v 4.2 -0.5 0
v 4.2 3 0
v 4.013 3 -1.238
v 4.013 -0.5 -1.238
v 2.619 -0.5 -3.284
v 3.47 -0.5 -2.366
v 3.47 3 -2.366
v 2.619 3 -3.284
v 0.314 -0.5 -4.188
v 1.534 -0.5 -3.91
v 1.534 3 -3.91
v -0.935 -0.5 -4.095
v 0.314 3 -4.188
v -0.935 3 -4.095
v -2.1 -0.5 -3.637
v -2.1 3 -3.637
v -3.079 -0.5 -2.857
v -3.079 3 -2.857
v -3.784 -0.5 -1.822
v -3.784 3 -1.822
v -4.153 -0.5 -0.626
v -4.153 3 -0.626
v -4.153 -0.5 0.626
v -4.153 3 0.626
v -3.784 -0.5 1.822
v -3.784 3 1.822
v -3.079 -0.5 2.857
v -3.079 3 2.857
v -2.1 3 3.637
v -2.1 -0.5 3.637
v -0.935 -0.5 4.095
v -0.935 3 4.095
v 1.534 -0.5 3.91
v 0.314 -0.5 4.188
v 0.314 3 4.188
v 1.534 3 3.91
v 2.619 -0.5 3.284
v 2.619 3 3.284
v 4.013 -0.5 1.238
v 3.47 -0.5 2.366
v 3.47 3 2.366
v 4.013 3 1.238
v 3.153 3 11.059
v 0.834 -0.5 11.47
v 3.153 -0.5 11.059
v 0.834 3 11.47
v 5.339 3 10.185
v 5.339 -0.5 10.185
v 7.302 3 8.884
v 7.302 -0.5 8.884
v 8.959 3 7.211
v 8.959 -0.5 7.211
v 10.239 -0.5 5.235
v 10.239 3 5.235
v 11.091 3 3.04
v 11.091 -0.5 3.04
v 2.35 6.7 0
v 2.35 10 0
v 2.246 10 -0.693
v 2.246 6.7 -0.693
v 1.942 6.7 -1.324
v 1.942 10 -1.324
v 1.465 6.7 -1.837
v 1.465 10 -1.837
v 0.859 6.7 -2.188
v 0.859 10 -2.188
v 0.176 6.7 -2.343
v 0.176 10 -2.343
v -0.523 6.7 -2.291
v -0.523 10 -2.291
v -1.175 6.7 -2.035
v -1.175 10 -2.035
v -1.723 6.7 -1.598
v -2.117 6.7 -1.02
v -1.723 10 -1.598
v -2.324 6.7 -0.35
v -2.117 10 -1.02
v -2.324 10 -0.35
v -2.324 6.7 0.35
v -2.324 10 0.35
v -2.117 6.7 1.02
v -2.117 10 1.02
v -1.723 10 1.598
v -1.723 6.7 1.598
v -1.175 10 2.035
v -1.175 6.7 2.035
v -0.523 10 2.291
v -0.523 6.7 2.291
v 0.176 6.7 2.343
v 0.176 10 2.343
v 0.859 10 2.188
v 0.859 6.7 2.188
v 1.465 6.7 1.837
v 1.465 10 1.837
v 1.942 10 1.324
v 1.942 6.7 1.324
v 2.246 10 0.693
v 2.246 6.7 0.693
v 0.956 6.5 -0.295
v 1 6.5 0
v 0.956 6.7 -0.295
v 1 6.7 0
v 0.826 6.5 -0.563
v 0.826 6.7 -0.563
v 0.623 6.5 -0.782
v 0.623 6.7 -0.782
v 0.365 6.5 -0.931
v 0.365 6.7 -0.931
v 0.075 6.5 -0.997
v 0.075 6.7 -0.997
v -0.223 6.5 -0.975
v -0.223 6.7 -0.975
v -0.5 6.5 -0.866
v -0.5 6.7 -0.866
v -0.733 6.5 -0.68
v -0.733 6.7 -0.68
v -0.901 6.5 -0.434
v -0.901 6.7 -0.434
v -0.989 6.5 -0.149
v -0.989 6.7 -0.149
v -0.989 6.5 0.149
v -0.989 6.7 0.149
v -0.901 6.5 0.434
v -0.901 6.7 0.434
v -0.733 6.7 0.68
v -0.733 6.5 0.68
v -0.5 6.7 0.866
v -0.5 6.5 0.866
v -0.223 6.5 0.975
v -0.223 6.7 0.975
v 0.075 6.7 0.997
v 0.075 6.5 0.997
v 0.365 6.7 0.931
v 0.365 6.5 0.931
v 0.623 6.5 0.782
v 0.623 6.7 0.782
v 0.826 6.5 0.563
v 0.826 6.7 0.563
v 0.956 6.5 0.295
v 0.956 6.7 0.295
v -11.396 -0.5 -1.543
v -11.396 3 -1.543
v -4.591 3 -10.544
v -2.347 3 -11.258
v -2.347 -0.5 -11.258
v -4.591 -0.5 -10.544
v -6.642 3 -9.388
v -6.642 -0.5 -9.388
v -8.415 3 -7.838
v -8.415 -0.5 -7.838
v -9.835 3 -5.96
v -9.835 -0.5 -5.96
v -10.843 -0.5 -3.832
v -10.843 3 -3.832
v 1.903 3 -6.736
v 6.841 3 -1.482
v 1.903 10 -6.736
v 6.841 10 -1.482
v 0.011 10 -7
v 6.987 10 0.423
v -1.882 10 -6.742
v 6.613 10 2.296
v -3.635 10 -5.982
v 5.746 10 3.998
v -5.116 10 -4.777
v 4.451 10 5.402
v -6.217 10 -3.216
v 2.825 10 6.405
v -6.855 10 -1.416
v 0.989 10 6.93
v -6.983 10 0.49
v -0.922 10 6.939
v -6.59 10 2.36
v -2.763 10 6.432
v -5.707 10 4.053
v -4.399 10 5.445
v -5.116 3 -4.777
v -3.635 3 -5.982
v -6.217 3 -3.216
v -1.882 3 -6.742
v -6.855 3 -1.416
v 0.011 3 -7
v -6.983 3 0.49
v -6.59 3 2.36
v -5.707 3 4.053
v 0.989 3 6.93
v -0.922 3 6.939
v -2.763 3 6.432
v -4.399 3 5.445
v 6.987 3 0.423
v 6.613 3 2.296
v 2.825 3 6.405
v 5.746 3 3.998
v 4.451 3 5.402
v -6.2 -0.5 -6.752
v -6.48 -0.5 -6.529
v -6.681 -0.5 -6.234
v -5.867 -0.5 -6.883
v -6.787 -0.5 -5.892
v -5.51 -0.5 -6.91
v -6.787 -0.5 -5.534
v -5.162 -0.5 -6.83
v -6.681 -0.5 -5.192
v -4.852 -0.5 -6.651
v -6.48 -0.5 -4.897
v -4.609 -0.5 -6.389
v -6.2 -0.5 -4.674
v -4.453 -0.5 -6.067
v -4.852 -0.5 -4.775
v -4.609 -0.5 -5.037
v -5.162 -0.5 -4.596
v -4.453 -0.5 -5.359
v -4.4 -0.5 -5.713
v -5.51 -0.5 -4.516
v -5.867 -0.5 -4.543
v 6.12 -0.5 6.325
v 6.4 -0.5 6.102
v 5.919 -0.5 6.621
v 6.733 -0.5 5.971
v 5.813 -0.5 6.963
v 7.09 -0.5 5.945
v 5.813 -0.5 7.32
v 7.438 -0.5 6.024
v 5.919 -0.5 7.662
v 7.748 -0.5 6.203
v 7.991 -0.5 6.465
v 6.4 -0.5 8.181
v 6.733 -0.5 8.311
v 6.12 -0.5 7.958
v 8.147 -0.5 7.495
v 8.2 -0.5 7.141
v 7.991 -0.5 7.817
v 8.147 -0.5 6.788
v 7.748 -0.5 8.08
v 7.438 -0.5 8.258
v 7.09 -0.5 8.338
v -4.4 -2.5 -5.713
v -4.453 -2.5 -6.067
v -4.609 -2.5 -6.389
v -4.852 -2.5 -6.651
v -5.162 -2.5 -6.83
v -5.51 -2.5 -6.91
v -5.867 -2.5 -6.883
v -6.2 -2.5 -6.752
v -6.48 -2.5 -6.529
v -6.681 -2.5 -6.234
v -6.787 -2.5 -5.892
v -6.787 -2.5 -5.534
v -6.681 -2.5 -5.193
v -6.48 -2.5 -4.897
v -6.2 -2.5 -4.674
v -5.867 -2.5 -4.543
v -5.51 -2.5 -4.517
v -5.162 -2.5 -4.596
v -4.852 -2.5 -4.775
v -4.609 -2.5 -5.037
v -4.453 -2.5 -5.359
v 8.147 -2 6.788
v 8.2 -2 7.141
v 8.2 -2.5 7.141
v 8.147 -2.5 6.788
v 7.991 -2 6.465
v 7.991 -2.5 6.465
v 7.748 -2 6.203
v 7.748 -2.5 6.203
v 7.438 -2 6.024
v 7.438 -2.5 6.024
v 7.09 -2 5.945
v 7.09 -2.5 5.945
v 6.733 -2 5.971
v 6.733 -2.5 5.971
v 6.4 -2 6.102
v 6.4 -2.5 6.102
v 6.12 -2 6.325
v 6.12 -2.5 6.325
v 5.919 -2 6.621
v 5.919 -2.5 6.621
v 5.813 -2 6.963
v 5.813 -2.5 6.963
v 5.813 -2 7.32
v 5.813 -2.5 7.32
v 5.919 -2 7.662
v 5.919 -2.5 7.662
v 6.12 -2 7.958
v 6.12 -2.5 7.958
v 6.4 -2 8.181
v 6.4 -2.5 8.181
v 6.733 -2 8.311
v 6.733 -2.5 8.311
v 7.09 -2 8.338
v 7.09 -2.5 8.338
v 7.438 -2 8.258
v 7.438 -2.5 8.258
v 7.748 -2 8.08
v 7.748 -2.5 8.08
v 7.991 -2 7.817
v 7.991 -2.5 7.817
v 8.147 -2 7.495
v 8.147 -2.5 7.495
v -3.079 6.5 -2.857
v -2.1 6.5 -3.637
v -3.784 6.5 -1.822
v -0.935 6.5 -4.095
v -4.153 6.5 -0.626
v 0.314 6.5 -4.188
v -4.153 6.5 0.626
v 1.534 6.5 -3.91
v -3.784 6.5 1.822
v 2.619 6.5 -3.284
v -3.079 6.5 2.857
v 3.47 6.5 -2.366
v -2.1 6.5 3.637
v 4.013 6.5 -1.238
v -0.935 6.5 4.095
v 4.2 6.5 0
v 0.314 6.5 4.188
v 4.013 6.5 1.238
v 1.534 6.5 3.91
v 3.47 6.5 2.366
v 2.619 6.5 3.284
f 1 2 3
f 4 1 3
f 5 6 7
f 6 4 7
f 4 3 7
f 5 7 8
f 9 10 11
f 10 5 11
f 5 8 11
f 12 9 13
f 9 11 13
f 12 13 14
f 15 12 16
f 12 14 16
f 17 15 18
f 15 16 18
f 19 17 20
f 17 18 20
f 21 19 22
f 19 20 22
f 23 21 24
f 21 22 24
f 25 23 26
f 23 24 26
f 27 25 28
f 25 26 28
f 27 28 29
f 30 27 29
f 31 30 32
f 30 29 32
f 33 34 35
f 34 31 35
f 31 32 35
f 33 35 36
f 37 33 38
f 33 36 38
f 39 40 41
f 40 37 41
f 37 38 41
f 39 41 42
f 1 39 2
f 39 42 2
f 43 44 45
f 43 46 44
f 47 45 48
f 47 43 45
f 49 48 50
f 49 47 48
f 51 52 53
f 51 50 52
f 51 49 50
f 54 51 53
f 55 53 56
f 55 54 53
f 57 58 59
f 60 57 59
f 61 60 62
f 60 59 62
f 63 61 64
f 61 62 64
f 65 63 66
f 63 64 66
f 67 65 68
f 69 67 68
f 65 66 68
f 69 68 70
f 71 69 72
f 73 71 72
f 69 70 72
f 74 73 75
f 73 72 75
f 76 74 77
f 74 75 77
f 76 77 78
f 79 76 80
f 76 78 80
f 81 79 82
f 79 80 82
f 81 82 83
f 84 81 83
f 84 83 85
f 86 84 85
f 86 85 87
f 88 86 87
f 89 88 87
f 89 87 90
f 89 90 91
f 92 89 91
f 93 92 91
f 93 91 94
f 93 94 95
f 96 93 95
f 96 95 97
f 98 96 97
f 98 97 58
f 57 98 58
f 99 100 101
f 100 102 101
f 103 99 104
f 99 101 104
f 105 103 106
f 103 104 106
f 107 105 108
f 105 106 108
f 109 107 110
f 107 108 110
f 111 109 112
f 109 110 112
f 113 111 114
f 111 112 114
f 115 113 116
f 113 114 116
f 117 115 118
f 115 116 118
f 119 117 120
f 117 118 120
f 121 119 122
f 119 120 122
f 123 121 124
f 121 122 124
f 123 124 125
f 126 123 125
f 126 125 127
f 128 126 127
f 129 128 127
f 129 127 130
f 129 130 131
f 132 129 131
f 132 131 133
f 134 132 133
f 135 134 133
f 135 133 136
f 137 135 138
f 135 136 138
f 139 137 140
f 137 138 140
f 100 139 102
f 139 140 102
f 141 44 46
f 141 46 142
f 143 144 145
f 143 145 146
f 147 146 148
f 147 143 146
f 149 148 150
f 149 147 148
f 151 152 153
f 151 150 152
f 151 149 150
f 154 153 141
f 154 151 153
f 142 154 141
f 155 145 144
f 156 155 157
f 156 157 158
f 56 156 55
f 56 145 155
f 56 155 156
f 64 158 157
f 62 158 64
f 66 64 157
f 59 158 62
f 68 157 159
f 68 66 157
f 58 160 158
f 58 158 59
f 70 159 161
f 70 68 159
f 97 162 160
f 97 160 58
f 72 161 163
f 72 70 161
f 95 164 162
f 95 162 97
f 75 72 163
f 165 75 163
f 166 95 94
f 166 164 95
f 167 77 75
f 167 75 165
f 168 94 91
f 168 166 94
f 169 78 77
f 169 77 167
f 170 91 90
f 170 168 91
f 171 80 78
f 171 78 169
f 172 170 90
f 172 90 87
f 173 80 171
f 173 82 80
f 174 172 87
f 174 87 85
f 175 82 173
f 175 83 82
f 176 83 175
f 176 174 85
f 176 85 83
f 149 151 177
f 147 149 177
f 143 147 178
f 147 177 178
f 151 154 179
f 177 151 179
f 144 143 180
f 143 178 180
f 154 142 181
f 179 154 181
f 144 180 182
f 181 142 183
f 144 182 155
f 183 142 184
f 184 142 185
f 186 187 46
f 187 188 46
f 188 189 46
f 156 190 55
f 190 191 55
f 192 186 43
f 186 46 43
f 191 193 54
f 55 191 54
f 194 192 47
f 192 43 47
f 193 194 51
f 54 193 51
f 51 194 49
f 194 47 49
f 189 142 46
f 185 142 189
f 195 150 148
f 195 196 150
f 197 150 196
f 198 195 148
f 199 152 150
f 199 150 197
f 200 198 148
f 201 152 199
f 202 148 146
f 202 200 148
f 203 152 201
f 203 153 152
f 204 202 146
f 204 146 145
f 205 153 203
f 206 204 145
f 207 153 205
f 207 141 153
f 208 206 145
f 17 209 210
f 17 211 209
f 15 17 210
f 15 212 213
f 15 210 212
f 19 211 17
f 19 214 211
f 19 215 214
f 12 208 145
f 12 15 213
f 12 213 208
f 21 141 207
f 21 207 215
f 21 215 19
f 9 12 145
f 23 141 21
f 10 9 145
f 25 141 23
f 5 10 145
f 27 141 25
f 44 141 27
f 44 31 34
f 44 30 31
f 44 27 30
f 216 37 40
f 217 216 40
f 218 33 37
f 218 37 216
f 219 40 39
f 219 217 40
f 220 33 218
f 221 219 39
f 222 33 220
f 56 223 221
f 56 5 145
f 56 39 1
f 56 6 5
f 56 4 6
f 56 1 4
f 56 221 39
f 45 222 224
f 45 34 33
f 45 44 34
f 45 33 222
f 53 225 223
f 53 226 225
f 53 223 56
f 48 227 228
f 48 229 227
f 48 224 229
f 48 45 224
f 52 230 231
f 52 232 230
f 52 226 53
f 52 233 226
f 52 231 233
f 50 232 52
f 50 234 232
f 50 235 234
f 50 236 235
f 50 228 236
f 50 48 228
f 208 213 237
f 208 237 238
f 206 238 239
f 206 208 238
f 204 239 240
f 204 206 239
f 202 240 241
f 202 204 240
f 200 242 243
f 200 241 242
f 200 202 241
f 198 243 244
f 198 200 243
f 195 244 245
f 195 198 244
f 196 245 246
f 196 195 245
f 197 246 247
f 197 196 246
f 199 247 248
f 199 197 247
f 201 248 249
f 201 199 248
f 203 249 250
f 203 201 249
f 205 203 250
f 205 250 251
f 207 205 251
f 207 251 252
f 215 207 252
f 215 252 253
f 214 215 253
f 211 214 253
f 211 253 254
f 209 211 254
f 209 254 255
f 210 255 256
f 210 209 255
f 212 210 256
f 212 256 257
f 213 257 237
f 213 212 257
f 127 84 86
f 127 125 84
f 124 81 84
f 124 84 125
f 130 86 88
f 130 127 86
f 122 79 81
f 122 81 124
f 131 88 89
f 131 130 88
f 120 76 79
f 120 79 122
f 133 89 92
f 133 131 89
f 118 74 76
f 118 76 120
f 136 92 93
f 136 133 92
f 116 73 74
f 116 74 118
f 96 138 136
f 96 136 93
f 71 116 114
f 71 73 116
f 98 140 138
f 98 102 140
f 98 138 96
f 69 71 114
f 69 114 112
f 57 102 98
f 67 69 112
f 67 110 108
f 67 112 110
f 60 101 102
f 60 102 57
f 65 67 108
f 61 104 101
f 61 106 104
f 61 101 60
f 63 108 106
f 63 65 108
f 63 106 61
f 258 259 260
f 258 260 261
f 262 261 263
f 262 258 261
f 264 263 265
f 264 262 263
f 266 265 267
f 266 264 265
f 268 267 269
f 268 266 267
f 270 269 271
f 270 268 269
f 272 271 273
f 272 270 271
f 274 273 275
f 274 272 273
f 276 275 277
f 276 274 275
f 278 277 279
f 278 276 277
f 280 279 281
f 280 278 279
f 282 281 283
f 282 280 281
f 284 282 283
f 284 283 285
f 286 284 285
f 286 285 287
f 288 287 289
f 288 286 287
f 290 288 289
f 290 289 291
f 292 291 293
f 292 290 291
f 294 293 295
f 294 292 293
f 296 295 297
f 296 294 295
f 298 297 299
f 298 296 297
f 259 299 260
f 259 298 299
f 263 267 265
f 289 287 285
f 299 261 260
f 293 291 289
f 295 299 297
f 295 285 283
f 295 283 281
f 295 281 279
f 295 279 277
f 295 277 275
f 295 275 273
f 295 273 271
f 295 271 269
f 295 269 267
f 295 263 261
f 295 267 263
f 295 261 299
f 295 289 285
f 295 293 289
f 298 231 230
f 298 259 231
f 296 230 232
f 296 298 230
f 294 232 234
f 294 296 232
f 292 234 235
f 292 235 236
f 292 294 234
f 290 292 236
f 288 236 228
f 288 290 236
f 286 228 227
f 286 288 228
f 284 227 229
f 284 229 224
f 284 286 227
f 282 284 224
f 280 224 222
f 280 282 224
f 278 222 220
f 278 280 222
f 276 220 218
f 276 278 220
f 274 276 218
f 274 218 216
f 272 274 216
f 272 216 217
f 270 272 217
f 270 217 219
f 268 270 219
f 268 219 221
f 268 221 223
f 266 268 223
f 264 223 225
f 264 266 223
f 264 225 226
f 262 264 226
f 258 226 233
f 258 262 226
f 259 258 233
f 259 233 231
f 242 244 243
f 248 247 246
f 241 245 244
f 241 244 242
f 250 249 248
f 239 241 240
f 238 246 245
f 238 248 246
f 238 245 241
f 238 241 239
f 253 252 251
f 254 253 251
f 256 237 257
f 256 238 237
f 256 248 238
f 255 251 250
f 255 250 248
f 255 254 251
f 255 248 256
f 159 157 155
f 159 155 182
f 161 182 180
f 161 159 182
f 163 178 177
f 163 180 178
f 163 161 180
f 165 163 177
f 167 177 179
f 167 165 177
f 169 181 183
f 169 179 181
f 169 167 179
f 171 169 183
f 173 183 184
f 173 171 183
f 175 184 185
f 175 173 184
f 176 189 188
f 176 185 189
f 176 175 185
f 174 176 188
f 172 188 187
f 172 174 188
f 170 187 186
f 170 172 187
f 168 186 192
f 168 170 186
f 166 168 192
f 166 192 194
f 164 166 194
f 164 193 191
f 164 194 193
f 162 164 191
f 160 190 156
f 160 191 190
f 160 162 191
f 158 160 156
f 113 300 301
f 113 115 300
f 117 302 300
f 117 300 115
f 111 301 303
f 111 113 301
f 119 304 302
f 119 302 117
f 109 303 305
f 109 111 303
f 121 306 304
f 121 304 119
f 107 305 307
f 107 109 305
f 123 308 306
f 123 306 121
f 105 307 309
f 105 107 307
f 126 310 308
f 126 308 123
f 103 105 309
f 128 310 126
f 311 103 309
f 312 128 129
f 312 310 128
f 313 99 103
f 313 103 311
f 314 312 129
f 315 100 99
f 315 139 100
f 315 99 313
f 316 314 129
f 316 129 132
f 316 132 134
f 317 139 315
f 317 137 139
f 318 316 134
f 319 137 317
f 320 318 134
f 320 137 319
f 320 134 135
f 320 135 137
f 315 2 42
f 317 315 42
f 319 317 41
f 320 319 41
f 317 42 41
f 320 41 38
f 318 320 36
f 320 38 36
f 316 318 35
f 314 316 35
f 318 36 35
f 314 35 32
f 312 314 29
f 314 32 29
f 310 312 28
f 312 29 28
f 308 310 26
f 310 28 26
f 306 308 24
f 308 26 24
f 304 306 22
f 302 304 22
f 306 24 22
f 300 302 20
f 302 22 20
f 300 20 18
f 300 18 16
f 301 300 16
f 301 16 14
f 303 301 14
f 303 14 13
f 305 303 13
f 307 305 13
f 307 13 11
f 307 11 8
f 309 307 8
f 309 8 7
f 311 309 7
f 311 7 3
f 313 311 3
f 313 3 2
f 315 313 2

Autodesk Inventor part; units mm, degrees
ref_plane "YZ Plane" through (0, 0, 0) normal (1, 0, 0) x (0, 1, 0)
ref_plane "XZ Plane" through (0, 0, 0) normal (0, 1, 0) x (-1, 0, 0)
ref_plane "XY Plane" through (0, 0, 0) normal (0, 0, 1) x (1, 0, 0)
sketch "Skizze1" plane through (0, 0, 0) normal (0, 1, 0) x (-1, 0, 0)
  circle A0 centre (0, 0) radius 15
  dimension "d0" = 30
extrude "Extrusion1" add sketch "Skizze1" along normal blind 10
sketch "Skizze2" plane through (0, 0, 0) normal (0, -1, 0) x (1, 0, 0)
  line L0 (14.3188, 0.9) -> (12.9688, 0.9)
  line L1 (12.9688, -0.9) -> (14.3188, -0.9)
  line L2 (14.3188, -0.9) -> (14.3188, 0.9)
  line L3 (-21.3175, 0) -> (21.3175, 0) projected
  arc A0 (12.9688, 0.9) -> (0.9, 12.9688) centre (0, 0) ccw
  line L4 (-0.9, -12.9688) -> (-0.9, -14.3188)
  line L5 (-0.9, -14.3188) -> (0.9, -14.3188)
  line L6 (0.9, -14.3188) -> (0.9, -12.9688)
  line L7 (-12.9688, 0.9) -> (-14.3188, 0.9)
  line L8 (-14.3188, 0.9) -> (-14.3188, -0.9)
  line L9 (-14.3188, -0.9) -> (-12.9688, -0.9)
  line L10 (-0.9, 12.9688) -> (-0.9, 14.3188)
  line L11 (-0.9, 14.3188) -> (0.9, 14.3188)
  line L12 (0.9, 14.3188) -> (0.9, 12.9688)
  line L13 (0, -21.3175) -> (0, 21.3175) projected
  line L14 (-21.3175, 0) -> (21.3175, 0) projected
  arc A1 (0.9, -12.9688) -> (12.9688, -0.9) centre (0, 0) ccw
  arc A2 (-12.9688, -0.9) -> (-0.9, -12.9688) centre (0, 0) ccw
  arc A3 (-0.9, 12.9688) -> (-12.9688, 0.9) centre (0, 0) ccw
  circle A4 centre (0, 0) radius 4.2
  circle A5 centre (7, 7.1414) radius 1.2
  circle A6 centre (-5.6, -5.7131) radius 1.2
  dimension "d4" = 0.9
  dimension "d5" = 0.9
  dimension "d8" = 1.35
  dimension "d9" = 1.35
  dimension "d10" = 1.8
  dimension "d11" = 0.9
  dimension "d12" = 1.35
  dimension "d13" = 1.8
  dimension "d14" = 0.9
  dimension "d15" = 0.9
  dimension "d16" = 1.35
  dimension "d17" = 8.4
  dimension "d18" = 2.4
  dimension "d19" = 2.4
  dimension "d20" = 8
  dimension "d21" = 10
  dimension "d22" = 7
  dimension "d23" = 5.6
  dimension "d50" = 13
  dimension "d51" = 13
  dimension "d52" = 1.35
  dimension "d53" = 1.35
  dimension "d54" = 1.35
extrude "Extrusion2" cut sketch "Skizze2" against normal blind 3 contours L2 L3 A4 L13 L11 L12 A0 L0 | L2 L1 A1 L6 L5 L13 A4 L3 | A4 L3 L8 L7 A3 L10 L11 L13 | L13 L5 L4 A2 L9 L8 L3 A4
sketch "Skizze4" plane through (7, 0, 7.1414) normal (0, -1, 0) x (1, 0, 0)
  circle A0 centre (-7, -7.1414) radius 4.2
  circle A1 centre (-12.6, -12.8546) radius 1.2
  circle A2 centre (0, 0) radius 1.2
  line L0 (-7, -28.1414) -> (-7, 13.8586) projected
  dimension "d26" = 2.4
  dimension "d27" = 5.6
  dimension "d28" = 8
  dimension "d44" = 8.4
  dimension "d45" = 2.4
extrude "Extrusion3" add sketch "Skizze4" along normal blind 2
sketch "Skizze5" plane through (0, 10, 0) normal (0, 1, 0) x (1, 0, 0)
  circle A0 centre (0, 0) radius 19.262
  circle A1 centre (0, 0) radius 7
  dimension "d31" = 14
extrude "Extrusion4" cut sketch "Skizze5" against normal blind 7
fillet "Rundung1" radius 1 8 edges at (12.9688, 1.5, -0.9) (12.9688, 1.5, 0.9) (0.9, 1.5, -12.9688) (-0.9, 1.5, -12.9688) (-12.9688, 1.5, -0.9) (-12.9688, 1.5, 0.9) (-0.9, 1.5, 12.9688) (0.9, 1.5, 12.9688)
sketch "Skizze8" plane through (0, 10, 0) normal (0, 1, 0) x (1, 0, 0)
  circle A0 centre (0, 0) radius 1
  dimension "d46" = 2
extrude "Extrusion7" cut sketch "Skizze8" against normal blind 7
sketch "Skizze9" plane through (0, -2, 0) normal (0, -1, 0) x (1, 0, 0)
  line L0 (18.2687, 9.2162) -> (-7.478, -18.1772)
  line L1 (-7.478, -18.1772) -> (18.2687, -18.1772)
  line L2 (18.2687, -18.1772) -> (18.2687, 9.2162)
  line L3 (8.0673, 18.8043) -> (-17.6793, -8.5891)
  line L4 (-17.6793, -8.5891) -> (-17.6793, 18.8043)
  line L5 (-17.6793, 18.8043) -> (8.0673, 18.8043)
  point P0 (0, 0)
  dimension "d55" = 7
  dimension "d56" = 7
extrude "Extrusion8" cut sketch "Skizze9" against normal blind 50
sketch "Skizze10" plane through (0, -2, 0) normal (0, -1, 0) x (1, 0, 0)
  circle A0 centre (0, 0) radius 11.5
  circle A1 centre (0, 0) radius 18.9246
  dimension "d61" = 23
extrude "Extrusion9" cut sketch "Skizze10" against normal blind 10
sketch "Skizze11" plane through (0, -2, 0) normal (0, -1, 0) x (1, 0, 0)
  circle A0 centre (0, 0) radius 1 projected
  circle A1 centre (0, 0) radius 4.2
extrude "Extrusion10" cut sketch "Skizze11" against normal blind 8.5 contours A0 | A1
sketch "Skizze13" plane through (0, 3, 0) normal (0, -1, 0) x (1, 0, 0)
  circle A0 centre (7, 7.1414) radius 1.2 projected
  circle A1 centre (7, 7.1414) radius 1.2
  circle A2 centre (-5.6, -5.7131) radius 1.2 projected
  circle A3 centre (-5.6, -5.7131) radius 1.2
  arc A4 (11.3495, 1.8544) -> (-0.5206, 11.4882) centre (0, 0) ccw
  line L0 (11.3495, 1.8544) -> (8.9749, -0.6721) projected
  line L1 (11.3495, 1.8544) -> (-1.1481, -11.4425)
  line L2 (-0.5206, 11.4882) -> (-11.4984, -0.1917)
  line L3 (1.2265, -8.916) -> (-1.1481, -11.4425) projected
  arc A5 (-11.4984, -0.1917) -> (-1.1481, -11.4425) centre (0, 0) ccw
  circle A6 centre (0, 0) radius 4.2
extrude "Extrusion11" add sketch "Skizze13" along normal blind 3.5
sketch "Skizze14" plane through (7, -2, 7.1414) normal (0, -1, 0) x (1, 0, 0)
  circle A0 centre (0, 0) radius 1.2 projected
  circle A1 centre (0, 0) radius 1.2
  circle A2 centre (-12.6, -12.8546) radius 1.2 projected
  circle A3 centre (-12.6, -12.8546) radius 1.2
  point P0 (-7, -7.1414)
extrude "Extrusion12" add sketch "Skizze14" along normal blind 0.5
sketch "Skizze15" plane through (0, 10, 0) normal (0, 1, 0) x (1, 0, 0)
  circle A0 centre (0, 0) radius 1 projected
  circle A1 centre (0, 0) radius 2.35
  dimension "d68" = 4.7
extrude "Extrusion13" cut sketch "Skizze15" against normal blind 3.3 contours A0 | A1
sketch "Skizze17" plane through (0, -0.5, 0) normal (0, -1, 0) x (1, 0, 0)
  line L0 (1.2267, 11.8871) -> (-14.9812, -5.3574)
  line L1 (-0.5206, 11.4882) -> (-11.4984, -0.1917) projected
  line L2 (-14.9812, -5.3574) -> (-14.9812, 19.8141)
  line L3 (-14.9812, 19.8141) -> (1.2267, 11.8871)
  line L4 (-3.5303, -12.5169) -> (12.8557, 4.9171)
  line L5 (-1.1481, -11.4425) -> (5.1007, -4.7941) projected
  line L6 (12.8557, 4.9171) -> (12.8557, -12.5169)
  line L7 (12.8557, -12.5169) -> (-3.5303, -12.5169)
  point P0 (0, 0)
  point P1 (-5.1007, 4.7941)
  point P2 (-11.4984, -0.1917)
  dimension "d71" = 1
  dimension "d72" = 1
extrude "Extrusion14" cut sketch "Skizze17" against normal blind 15
properties part number "Adaptation_on_OPdevside_4_2"
